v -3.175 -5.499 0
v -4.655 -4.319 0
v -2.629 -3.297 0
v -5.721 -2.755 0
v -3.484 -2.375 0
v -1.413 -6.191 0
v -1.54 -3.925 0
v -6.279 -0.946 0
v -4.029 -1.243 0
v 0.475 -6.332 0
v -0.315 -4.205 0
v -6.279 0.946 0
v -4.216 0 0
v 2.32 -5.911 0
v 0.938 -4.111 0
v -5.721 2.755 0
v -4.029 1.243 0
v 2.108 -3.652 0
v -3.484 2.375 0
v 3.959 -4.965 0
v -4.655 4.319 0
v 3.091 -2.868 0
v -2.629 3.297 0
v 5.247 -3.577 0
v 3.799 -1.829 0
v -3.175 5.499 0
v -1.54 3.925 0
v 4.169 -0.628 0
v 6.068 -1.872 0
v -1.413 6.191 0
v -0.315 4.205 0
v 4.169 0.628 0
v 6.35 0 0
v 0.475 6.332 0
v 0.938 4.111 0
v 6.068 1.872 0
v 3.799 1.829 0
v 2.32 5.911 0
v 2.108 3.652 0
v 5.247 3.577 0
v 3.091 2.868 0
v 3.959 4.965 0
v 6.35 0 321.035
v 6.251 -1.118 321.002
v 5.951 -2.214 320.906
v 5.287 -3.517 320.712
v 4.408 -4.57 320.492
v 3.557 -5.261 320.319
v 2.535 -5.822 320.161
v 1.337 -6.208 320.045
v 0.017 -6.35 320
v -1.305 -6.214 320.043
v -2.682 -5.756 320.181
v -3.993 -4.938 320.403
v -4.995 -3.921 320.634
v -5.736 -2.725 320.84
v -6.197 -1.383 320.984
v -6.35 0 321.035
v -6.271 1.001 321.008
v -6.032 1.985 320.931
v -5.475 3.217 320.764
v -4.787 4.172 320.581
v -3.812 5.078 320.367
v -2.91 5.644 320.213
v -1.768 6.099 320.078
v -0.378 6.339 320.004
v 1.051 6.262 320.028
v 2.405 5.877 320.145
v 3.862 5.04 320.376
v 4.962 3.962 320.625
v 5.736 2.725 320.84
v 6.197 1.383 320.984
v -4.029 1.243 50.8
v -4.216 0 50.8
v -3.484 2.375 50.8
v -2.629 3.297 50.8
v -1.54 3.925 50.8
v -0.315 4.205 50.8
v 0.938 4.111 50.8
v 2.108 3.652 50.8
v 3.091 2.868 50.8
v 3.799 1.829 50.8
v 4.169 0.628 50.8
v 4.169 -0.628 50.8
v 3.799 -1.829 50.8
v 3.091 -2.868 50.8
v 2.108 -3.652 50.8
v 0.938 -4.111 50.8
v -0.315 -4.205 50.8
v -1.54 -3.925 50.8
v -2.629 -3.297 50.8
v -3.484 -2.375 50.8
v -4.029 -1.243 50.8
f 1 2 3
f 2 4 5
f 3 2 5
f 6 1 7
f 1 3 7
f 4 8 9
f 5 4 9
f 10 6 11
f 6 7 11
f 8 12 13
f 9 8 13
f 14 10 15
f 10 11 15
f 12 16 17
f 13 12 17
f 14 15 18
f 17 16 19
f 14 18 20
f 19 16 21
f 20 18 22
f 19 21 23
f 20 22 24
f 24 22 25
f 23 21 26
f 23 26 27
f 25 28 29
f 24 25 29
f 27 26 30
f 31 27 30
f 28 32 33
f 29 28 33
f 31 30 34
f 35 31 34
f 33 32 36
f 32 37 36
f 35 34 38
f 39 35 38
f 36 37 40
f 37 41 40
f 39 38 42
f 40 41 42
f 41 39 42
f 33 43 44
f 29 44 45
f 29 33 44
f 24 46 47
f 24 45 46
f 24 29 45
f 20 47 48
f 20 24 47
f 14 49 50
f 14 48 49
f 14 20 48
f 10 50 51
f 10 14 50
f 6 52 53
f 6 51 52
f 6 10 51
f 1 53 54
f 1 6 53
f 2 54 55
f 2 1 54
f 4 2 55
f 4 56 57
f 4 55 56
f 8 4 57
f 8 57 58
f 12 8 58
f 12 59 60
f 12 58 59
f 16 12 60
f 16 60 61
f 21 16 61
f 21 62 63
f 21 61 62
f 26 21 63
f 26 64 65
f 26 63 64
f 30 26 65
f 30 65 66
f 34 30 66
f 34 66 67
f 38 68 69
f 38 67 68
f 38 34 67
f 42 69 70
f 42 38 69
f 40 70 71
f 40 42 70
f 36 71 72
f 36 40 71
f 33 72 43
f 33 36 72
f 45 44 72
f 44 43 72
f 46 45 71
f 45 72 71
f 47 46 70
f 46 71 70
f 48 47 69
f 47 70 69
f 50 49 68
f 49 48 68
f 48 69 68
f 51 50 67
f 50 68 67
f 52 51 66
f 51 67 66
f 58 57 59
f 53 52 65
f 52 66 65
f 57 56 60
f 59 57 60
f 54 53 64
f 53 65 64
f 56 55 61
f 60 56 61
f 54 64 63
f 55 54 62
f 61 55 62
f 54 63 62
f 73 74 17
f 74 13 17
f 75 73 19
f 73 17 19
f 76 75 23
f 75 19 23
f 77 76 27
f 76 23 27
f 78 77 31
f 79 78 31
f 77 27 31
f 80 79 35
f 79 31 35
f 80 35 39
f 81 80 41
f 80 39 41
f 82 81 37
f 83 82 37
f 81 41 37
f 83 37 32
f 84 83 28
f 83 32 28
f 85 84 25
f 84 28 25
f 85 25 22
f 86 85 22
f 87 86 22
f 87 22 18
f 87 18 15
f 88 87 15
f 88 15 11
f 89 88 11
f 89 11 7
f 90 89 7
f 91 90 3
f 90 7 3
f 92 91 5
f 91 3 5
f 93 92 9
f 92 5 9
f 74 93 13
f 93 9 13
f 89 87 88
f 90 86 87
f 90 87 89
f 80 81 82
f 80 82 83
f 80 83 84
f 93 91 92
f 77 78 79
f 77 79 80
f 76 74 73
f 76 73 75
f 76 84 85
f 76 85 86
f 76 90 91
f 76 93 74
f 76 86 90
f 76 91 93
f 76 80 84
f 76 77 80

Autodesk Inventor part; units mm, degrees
ref_plane "YZ Plane" through (0, 0, 0) normal (1, 0, 0) x (0, 1, 0)
ref_plane "Start Plane" through (0, 0, 0) normal (0, 0, 1) x (1, 0, 0)
ref_plane "End Plane" through (0, 0, 340) normal (0, 0, 1) x (1, 0, 0)
sketch "Sketch" plane through (0, 0, 0) normal (0, 0, 1) x (1, 0, 0)
  circle A0 centre (0, 0) radius 6.35
  dimension "d0" = 12.7
extrude "Body" add sketch "Sketch" along normal up to surface (340 mm away) from surface at 0
sketch "Sketch2" plane through (0, 0, 0) normal (0, 0, 1) x (1, 0, 0)
  line L0 (0, 0) -> (10, 0)
ref_plane "Work Plane3" through (0, 0, 0) normal (0, -1, 0) x (1, 0, 0)
sketch "Sketch4" plane through (0, 0, 0) normal (0, 1, 0) x (-1, 0, 0)
  line L0 (-6.35, 340) -> (6.35, 340) projected
  circle A0 centre (0, 340) radius 20
  point P0 (0, 0)
  dimension "d11" = 40
extrude "Extrusion2" cut sketch "Sketch4" along normal through all both and the other way through all
sketch "Sketch5" plane through (0, 0, 0) normal (0, 0, -1) x (-1, 0, 0)
  circle A0 centre (0, 0) radius 4.2164
  dimension "d12" = 8.4328
extrude "Extrusion3" cut sketch "Sketch5" against normal blind 50.8
thread "Thread1" size "3/8-24 UNF" class "2B" standard "ANSI Unified Screw Threads" full length
sketch "Sketch3" plane through (0, 0, 0) normal (0, -1, 0) x (1, 0, 0)
  line L0 (-2, 0) -> (12, 0) projected
  line L1 (-2, 340) -> (12, 340) projected
  dimension "d7" = 340
equation "\"d0\" = Diam"
equation "\"d1\" = G_L"
equation "\"Diam\" = 12.7"
equation "\"G_L\" = d7"
equation "\"G_OFFSET_START\" = 0"
equation "\"G_OFFSET_END\" = 0"
equation "\"d5\" = G_OFFSET_END + B_L"
equation "\"B_L\" = 340"
properties part number "ANSI/AISC Rolled Steel - 1/2-13.386, RB" material "Steel, Mild"
